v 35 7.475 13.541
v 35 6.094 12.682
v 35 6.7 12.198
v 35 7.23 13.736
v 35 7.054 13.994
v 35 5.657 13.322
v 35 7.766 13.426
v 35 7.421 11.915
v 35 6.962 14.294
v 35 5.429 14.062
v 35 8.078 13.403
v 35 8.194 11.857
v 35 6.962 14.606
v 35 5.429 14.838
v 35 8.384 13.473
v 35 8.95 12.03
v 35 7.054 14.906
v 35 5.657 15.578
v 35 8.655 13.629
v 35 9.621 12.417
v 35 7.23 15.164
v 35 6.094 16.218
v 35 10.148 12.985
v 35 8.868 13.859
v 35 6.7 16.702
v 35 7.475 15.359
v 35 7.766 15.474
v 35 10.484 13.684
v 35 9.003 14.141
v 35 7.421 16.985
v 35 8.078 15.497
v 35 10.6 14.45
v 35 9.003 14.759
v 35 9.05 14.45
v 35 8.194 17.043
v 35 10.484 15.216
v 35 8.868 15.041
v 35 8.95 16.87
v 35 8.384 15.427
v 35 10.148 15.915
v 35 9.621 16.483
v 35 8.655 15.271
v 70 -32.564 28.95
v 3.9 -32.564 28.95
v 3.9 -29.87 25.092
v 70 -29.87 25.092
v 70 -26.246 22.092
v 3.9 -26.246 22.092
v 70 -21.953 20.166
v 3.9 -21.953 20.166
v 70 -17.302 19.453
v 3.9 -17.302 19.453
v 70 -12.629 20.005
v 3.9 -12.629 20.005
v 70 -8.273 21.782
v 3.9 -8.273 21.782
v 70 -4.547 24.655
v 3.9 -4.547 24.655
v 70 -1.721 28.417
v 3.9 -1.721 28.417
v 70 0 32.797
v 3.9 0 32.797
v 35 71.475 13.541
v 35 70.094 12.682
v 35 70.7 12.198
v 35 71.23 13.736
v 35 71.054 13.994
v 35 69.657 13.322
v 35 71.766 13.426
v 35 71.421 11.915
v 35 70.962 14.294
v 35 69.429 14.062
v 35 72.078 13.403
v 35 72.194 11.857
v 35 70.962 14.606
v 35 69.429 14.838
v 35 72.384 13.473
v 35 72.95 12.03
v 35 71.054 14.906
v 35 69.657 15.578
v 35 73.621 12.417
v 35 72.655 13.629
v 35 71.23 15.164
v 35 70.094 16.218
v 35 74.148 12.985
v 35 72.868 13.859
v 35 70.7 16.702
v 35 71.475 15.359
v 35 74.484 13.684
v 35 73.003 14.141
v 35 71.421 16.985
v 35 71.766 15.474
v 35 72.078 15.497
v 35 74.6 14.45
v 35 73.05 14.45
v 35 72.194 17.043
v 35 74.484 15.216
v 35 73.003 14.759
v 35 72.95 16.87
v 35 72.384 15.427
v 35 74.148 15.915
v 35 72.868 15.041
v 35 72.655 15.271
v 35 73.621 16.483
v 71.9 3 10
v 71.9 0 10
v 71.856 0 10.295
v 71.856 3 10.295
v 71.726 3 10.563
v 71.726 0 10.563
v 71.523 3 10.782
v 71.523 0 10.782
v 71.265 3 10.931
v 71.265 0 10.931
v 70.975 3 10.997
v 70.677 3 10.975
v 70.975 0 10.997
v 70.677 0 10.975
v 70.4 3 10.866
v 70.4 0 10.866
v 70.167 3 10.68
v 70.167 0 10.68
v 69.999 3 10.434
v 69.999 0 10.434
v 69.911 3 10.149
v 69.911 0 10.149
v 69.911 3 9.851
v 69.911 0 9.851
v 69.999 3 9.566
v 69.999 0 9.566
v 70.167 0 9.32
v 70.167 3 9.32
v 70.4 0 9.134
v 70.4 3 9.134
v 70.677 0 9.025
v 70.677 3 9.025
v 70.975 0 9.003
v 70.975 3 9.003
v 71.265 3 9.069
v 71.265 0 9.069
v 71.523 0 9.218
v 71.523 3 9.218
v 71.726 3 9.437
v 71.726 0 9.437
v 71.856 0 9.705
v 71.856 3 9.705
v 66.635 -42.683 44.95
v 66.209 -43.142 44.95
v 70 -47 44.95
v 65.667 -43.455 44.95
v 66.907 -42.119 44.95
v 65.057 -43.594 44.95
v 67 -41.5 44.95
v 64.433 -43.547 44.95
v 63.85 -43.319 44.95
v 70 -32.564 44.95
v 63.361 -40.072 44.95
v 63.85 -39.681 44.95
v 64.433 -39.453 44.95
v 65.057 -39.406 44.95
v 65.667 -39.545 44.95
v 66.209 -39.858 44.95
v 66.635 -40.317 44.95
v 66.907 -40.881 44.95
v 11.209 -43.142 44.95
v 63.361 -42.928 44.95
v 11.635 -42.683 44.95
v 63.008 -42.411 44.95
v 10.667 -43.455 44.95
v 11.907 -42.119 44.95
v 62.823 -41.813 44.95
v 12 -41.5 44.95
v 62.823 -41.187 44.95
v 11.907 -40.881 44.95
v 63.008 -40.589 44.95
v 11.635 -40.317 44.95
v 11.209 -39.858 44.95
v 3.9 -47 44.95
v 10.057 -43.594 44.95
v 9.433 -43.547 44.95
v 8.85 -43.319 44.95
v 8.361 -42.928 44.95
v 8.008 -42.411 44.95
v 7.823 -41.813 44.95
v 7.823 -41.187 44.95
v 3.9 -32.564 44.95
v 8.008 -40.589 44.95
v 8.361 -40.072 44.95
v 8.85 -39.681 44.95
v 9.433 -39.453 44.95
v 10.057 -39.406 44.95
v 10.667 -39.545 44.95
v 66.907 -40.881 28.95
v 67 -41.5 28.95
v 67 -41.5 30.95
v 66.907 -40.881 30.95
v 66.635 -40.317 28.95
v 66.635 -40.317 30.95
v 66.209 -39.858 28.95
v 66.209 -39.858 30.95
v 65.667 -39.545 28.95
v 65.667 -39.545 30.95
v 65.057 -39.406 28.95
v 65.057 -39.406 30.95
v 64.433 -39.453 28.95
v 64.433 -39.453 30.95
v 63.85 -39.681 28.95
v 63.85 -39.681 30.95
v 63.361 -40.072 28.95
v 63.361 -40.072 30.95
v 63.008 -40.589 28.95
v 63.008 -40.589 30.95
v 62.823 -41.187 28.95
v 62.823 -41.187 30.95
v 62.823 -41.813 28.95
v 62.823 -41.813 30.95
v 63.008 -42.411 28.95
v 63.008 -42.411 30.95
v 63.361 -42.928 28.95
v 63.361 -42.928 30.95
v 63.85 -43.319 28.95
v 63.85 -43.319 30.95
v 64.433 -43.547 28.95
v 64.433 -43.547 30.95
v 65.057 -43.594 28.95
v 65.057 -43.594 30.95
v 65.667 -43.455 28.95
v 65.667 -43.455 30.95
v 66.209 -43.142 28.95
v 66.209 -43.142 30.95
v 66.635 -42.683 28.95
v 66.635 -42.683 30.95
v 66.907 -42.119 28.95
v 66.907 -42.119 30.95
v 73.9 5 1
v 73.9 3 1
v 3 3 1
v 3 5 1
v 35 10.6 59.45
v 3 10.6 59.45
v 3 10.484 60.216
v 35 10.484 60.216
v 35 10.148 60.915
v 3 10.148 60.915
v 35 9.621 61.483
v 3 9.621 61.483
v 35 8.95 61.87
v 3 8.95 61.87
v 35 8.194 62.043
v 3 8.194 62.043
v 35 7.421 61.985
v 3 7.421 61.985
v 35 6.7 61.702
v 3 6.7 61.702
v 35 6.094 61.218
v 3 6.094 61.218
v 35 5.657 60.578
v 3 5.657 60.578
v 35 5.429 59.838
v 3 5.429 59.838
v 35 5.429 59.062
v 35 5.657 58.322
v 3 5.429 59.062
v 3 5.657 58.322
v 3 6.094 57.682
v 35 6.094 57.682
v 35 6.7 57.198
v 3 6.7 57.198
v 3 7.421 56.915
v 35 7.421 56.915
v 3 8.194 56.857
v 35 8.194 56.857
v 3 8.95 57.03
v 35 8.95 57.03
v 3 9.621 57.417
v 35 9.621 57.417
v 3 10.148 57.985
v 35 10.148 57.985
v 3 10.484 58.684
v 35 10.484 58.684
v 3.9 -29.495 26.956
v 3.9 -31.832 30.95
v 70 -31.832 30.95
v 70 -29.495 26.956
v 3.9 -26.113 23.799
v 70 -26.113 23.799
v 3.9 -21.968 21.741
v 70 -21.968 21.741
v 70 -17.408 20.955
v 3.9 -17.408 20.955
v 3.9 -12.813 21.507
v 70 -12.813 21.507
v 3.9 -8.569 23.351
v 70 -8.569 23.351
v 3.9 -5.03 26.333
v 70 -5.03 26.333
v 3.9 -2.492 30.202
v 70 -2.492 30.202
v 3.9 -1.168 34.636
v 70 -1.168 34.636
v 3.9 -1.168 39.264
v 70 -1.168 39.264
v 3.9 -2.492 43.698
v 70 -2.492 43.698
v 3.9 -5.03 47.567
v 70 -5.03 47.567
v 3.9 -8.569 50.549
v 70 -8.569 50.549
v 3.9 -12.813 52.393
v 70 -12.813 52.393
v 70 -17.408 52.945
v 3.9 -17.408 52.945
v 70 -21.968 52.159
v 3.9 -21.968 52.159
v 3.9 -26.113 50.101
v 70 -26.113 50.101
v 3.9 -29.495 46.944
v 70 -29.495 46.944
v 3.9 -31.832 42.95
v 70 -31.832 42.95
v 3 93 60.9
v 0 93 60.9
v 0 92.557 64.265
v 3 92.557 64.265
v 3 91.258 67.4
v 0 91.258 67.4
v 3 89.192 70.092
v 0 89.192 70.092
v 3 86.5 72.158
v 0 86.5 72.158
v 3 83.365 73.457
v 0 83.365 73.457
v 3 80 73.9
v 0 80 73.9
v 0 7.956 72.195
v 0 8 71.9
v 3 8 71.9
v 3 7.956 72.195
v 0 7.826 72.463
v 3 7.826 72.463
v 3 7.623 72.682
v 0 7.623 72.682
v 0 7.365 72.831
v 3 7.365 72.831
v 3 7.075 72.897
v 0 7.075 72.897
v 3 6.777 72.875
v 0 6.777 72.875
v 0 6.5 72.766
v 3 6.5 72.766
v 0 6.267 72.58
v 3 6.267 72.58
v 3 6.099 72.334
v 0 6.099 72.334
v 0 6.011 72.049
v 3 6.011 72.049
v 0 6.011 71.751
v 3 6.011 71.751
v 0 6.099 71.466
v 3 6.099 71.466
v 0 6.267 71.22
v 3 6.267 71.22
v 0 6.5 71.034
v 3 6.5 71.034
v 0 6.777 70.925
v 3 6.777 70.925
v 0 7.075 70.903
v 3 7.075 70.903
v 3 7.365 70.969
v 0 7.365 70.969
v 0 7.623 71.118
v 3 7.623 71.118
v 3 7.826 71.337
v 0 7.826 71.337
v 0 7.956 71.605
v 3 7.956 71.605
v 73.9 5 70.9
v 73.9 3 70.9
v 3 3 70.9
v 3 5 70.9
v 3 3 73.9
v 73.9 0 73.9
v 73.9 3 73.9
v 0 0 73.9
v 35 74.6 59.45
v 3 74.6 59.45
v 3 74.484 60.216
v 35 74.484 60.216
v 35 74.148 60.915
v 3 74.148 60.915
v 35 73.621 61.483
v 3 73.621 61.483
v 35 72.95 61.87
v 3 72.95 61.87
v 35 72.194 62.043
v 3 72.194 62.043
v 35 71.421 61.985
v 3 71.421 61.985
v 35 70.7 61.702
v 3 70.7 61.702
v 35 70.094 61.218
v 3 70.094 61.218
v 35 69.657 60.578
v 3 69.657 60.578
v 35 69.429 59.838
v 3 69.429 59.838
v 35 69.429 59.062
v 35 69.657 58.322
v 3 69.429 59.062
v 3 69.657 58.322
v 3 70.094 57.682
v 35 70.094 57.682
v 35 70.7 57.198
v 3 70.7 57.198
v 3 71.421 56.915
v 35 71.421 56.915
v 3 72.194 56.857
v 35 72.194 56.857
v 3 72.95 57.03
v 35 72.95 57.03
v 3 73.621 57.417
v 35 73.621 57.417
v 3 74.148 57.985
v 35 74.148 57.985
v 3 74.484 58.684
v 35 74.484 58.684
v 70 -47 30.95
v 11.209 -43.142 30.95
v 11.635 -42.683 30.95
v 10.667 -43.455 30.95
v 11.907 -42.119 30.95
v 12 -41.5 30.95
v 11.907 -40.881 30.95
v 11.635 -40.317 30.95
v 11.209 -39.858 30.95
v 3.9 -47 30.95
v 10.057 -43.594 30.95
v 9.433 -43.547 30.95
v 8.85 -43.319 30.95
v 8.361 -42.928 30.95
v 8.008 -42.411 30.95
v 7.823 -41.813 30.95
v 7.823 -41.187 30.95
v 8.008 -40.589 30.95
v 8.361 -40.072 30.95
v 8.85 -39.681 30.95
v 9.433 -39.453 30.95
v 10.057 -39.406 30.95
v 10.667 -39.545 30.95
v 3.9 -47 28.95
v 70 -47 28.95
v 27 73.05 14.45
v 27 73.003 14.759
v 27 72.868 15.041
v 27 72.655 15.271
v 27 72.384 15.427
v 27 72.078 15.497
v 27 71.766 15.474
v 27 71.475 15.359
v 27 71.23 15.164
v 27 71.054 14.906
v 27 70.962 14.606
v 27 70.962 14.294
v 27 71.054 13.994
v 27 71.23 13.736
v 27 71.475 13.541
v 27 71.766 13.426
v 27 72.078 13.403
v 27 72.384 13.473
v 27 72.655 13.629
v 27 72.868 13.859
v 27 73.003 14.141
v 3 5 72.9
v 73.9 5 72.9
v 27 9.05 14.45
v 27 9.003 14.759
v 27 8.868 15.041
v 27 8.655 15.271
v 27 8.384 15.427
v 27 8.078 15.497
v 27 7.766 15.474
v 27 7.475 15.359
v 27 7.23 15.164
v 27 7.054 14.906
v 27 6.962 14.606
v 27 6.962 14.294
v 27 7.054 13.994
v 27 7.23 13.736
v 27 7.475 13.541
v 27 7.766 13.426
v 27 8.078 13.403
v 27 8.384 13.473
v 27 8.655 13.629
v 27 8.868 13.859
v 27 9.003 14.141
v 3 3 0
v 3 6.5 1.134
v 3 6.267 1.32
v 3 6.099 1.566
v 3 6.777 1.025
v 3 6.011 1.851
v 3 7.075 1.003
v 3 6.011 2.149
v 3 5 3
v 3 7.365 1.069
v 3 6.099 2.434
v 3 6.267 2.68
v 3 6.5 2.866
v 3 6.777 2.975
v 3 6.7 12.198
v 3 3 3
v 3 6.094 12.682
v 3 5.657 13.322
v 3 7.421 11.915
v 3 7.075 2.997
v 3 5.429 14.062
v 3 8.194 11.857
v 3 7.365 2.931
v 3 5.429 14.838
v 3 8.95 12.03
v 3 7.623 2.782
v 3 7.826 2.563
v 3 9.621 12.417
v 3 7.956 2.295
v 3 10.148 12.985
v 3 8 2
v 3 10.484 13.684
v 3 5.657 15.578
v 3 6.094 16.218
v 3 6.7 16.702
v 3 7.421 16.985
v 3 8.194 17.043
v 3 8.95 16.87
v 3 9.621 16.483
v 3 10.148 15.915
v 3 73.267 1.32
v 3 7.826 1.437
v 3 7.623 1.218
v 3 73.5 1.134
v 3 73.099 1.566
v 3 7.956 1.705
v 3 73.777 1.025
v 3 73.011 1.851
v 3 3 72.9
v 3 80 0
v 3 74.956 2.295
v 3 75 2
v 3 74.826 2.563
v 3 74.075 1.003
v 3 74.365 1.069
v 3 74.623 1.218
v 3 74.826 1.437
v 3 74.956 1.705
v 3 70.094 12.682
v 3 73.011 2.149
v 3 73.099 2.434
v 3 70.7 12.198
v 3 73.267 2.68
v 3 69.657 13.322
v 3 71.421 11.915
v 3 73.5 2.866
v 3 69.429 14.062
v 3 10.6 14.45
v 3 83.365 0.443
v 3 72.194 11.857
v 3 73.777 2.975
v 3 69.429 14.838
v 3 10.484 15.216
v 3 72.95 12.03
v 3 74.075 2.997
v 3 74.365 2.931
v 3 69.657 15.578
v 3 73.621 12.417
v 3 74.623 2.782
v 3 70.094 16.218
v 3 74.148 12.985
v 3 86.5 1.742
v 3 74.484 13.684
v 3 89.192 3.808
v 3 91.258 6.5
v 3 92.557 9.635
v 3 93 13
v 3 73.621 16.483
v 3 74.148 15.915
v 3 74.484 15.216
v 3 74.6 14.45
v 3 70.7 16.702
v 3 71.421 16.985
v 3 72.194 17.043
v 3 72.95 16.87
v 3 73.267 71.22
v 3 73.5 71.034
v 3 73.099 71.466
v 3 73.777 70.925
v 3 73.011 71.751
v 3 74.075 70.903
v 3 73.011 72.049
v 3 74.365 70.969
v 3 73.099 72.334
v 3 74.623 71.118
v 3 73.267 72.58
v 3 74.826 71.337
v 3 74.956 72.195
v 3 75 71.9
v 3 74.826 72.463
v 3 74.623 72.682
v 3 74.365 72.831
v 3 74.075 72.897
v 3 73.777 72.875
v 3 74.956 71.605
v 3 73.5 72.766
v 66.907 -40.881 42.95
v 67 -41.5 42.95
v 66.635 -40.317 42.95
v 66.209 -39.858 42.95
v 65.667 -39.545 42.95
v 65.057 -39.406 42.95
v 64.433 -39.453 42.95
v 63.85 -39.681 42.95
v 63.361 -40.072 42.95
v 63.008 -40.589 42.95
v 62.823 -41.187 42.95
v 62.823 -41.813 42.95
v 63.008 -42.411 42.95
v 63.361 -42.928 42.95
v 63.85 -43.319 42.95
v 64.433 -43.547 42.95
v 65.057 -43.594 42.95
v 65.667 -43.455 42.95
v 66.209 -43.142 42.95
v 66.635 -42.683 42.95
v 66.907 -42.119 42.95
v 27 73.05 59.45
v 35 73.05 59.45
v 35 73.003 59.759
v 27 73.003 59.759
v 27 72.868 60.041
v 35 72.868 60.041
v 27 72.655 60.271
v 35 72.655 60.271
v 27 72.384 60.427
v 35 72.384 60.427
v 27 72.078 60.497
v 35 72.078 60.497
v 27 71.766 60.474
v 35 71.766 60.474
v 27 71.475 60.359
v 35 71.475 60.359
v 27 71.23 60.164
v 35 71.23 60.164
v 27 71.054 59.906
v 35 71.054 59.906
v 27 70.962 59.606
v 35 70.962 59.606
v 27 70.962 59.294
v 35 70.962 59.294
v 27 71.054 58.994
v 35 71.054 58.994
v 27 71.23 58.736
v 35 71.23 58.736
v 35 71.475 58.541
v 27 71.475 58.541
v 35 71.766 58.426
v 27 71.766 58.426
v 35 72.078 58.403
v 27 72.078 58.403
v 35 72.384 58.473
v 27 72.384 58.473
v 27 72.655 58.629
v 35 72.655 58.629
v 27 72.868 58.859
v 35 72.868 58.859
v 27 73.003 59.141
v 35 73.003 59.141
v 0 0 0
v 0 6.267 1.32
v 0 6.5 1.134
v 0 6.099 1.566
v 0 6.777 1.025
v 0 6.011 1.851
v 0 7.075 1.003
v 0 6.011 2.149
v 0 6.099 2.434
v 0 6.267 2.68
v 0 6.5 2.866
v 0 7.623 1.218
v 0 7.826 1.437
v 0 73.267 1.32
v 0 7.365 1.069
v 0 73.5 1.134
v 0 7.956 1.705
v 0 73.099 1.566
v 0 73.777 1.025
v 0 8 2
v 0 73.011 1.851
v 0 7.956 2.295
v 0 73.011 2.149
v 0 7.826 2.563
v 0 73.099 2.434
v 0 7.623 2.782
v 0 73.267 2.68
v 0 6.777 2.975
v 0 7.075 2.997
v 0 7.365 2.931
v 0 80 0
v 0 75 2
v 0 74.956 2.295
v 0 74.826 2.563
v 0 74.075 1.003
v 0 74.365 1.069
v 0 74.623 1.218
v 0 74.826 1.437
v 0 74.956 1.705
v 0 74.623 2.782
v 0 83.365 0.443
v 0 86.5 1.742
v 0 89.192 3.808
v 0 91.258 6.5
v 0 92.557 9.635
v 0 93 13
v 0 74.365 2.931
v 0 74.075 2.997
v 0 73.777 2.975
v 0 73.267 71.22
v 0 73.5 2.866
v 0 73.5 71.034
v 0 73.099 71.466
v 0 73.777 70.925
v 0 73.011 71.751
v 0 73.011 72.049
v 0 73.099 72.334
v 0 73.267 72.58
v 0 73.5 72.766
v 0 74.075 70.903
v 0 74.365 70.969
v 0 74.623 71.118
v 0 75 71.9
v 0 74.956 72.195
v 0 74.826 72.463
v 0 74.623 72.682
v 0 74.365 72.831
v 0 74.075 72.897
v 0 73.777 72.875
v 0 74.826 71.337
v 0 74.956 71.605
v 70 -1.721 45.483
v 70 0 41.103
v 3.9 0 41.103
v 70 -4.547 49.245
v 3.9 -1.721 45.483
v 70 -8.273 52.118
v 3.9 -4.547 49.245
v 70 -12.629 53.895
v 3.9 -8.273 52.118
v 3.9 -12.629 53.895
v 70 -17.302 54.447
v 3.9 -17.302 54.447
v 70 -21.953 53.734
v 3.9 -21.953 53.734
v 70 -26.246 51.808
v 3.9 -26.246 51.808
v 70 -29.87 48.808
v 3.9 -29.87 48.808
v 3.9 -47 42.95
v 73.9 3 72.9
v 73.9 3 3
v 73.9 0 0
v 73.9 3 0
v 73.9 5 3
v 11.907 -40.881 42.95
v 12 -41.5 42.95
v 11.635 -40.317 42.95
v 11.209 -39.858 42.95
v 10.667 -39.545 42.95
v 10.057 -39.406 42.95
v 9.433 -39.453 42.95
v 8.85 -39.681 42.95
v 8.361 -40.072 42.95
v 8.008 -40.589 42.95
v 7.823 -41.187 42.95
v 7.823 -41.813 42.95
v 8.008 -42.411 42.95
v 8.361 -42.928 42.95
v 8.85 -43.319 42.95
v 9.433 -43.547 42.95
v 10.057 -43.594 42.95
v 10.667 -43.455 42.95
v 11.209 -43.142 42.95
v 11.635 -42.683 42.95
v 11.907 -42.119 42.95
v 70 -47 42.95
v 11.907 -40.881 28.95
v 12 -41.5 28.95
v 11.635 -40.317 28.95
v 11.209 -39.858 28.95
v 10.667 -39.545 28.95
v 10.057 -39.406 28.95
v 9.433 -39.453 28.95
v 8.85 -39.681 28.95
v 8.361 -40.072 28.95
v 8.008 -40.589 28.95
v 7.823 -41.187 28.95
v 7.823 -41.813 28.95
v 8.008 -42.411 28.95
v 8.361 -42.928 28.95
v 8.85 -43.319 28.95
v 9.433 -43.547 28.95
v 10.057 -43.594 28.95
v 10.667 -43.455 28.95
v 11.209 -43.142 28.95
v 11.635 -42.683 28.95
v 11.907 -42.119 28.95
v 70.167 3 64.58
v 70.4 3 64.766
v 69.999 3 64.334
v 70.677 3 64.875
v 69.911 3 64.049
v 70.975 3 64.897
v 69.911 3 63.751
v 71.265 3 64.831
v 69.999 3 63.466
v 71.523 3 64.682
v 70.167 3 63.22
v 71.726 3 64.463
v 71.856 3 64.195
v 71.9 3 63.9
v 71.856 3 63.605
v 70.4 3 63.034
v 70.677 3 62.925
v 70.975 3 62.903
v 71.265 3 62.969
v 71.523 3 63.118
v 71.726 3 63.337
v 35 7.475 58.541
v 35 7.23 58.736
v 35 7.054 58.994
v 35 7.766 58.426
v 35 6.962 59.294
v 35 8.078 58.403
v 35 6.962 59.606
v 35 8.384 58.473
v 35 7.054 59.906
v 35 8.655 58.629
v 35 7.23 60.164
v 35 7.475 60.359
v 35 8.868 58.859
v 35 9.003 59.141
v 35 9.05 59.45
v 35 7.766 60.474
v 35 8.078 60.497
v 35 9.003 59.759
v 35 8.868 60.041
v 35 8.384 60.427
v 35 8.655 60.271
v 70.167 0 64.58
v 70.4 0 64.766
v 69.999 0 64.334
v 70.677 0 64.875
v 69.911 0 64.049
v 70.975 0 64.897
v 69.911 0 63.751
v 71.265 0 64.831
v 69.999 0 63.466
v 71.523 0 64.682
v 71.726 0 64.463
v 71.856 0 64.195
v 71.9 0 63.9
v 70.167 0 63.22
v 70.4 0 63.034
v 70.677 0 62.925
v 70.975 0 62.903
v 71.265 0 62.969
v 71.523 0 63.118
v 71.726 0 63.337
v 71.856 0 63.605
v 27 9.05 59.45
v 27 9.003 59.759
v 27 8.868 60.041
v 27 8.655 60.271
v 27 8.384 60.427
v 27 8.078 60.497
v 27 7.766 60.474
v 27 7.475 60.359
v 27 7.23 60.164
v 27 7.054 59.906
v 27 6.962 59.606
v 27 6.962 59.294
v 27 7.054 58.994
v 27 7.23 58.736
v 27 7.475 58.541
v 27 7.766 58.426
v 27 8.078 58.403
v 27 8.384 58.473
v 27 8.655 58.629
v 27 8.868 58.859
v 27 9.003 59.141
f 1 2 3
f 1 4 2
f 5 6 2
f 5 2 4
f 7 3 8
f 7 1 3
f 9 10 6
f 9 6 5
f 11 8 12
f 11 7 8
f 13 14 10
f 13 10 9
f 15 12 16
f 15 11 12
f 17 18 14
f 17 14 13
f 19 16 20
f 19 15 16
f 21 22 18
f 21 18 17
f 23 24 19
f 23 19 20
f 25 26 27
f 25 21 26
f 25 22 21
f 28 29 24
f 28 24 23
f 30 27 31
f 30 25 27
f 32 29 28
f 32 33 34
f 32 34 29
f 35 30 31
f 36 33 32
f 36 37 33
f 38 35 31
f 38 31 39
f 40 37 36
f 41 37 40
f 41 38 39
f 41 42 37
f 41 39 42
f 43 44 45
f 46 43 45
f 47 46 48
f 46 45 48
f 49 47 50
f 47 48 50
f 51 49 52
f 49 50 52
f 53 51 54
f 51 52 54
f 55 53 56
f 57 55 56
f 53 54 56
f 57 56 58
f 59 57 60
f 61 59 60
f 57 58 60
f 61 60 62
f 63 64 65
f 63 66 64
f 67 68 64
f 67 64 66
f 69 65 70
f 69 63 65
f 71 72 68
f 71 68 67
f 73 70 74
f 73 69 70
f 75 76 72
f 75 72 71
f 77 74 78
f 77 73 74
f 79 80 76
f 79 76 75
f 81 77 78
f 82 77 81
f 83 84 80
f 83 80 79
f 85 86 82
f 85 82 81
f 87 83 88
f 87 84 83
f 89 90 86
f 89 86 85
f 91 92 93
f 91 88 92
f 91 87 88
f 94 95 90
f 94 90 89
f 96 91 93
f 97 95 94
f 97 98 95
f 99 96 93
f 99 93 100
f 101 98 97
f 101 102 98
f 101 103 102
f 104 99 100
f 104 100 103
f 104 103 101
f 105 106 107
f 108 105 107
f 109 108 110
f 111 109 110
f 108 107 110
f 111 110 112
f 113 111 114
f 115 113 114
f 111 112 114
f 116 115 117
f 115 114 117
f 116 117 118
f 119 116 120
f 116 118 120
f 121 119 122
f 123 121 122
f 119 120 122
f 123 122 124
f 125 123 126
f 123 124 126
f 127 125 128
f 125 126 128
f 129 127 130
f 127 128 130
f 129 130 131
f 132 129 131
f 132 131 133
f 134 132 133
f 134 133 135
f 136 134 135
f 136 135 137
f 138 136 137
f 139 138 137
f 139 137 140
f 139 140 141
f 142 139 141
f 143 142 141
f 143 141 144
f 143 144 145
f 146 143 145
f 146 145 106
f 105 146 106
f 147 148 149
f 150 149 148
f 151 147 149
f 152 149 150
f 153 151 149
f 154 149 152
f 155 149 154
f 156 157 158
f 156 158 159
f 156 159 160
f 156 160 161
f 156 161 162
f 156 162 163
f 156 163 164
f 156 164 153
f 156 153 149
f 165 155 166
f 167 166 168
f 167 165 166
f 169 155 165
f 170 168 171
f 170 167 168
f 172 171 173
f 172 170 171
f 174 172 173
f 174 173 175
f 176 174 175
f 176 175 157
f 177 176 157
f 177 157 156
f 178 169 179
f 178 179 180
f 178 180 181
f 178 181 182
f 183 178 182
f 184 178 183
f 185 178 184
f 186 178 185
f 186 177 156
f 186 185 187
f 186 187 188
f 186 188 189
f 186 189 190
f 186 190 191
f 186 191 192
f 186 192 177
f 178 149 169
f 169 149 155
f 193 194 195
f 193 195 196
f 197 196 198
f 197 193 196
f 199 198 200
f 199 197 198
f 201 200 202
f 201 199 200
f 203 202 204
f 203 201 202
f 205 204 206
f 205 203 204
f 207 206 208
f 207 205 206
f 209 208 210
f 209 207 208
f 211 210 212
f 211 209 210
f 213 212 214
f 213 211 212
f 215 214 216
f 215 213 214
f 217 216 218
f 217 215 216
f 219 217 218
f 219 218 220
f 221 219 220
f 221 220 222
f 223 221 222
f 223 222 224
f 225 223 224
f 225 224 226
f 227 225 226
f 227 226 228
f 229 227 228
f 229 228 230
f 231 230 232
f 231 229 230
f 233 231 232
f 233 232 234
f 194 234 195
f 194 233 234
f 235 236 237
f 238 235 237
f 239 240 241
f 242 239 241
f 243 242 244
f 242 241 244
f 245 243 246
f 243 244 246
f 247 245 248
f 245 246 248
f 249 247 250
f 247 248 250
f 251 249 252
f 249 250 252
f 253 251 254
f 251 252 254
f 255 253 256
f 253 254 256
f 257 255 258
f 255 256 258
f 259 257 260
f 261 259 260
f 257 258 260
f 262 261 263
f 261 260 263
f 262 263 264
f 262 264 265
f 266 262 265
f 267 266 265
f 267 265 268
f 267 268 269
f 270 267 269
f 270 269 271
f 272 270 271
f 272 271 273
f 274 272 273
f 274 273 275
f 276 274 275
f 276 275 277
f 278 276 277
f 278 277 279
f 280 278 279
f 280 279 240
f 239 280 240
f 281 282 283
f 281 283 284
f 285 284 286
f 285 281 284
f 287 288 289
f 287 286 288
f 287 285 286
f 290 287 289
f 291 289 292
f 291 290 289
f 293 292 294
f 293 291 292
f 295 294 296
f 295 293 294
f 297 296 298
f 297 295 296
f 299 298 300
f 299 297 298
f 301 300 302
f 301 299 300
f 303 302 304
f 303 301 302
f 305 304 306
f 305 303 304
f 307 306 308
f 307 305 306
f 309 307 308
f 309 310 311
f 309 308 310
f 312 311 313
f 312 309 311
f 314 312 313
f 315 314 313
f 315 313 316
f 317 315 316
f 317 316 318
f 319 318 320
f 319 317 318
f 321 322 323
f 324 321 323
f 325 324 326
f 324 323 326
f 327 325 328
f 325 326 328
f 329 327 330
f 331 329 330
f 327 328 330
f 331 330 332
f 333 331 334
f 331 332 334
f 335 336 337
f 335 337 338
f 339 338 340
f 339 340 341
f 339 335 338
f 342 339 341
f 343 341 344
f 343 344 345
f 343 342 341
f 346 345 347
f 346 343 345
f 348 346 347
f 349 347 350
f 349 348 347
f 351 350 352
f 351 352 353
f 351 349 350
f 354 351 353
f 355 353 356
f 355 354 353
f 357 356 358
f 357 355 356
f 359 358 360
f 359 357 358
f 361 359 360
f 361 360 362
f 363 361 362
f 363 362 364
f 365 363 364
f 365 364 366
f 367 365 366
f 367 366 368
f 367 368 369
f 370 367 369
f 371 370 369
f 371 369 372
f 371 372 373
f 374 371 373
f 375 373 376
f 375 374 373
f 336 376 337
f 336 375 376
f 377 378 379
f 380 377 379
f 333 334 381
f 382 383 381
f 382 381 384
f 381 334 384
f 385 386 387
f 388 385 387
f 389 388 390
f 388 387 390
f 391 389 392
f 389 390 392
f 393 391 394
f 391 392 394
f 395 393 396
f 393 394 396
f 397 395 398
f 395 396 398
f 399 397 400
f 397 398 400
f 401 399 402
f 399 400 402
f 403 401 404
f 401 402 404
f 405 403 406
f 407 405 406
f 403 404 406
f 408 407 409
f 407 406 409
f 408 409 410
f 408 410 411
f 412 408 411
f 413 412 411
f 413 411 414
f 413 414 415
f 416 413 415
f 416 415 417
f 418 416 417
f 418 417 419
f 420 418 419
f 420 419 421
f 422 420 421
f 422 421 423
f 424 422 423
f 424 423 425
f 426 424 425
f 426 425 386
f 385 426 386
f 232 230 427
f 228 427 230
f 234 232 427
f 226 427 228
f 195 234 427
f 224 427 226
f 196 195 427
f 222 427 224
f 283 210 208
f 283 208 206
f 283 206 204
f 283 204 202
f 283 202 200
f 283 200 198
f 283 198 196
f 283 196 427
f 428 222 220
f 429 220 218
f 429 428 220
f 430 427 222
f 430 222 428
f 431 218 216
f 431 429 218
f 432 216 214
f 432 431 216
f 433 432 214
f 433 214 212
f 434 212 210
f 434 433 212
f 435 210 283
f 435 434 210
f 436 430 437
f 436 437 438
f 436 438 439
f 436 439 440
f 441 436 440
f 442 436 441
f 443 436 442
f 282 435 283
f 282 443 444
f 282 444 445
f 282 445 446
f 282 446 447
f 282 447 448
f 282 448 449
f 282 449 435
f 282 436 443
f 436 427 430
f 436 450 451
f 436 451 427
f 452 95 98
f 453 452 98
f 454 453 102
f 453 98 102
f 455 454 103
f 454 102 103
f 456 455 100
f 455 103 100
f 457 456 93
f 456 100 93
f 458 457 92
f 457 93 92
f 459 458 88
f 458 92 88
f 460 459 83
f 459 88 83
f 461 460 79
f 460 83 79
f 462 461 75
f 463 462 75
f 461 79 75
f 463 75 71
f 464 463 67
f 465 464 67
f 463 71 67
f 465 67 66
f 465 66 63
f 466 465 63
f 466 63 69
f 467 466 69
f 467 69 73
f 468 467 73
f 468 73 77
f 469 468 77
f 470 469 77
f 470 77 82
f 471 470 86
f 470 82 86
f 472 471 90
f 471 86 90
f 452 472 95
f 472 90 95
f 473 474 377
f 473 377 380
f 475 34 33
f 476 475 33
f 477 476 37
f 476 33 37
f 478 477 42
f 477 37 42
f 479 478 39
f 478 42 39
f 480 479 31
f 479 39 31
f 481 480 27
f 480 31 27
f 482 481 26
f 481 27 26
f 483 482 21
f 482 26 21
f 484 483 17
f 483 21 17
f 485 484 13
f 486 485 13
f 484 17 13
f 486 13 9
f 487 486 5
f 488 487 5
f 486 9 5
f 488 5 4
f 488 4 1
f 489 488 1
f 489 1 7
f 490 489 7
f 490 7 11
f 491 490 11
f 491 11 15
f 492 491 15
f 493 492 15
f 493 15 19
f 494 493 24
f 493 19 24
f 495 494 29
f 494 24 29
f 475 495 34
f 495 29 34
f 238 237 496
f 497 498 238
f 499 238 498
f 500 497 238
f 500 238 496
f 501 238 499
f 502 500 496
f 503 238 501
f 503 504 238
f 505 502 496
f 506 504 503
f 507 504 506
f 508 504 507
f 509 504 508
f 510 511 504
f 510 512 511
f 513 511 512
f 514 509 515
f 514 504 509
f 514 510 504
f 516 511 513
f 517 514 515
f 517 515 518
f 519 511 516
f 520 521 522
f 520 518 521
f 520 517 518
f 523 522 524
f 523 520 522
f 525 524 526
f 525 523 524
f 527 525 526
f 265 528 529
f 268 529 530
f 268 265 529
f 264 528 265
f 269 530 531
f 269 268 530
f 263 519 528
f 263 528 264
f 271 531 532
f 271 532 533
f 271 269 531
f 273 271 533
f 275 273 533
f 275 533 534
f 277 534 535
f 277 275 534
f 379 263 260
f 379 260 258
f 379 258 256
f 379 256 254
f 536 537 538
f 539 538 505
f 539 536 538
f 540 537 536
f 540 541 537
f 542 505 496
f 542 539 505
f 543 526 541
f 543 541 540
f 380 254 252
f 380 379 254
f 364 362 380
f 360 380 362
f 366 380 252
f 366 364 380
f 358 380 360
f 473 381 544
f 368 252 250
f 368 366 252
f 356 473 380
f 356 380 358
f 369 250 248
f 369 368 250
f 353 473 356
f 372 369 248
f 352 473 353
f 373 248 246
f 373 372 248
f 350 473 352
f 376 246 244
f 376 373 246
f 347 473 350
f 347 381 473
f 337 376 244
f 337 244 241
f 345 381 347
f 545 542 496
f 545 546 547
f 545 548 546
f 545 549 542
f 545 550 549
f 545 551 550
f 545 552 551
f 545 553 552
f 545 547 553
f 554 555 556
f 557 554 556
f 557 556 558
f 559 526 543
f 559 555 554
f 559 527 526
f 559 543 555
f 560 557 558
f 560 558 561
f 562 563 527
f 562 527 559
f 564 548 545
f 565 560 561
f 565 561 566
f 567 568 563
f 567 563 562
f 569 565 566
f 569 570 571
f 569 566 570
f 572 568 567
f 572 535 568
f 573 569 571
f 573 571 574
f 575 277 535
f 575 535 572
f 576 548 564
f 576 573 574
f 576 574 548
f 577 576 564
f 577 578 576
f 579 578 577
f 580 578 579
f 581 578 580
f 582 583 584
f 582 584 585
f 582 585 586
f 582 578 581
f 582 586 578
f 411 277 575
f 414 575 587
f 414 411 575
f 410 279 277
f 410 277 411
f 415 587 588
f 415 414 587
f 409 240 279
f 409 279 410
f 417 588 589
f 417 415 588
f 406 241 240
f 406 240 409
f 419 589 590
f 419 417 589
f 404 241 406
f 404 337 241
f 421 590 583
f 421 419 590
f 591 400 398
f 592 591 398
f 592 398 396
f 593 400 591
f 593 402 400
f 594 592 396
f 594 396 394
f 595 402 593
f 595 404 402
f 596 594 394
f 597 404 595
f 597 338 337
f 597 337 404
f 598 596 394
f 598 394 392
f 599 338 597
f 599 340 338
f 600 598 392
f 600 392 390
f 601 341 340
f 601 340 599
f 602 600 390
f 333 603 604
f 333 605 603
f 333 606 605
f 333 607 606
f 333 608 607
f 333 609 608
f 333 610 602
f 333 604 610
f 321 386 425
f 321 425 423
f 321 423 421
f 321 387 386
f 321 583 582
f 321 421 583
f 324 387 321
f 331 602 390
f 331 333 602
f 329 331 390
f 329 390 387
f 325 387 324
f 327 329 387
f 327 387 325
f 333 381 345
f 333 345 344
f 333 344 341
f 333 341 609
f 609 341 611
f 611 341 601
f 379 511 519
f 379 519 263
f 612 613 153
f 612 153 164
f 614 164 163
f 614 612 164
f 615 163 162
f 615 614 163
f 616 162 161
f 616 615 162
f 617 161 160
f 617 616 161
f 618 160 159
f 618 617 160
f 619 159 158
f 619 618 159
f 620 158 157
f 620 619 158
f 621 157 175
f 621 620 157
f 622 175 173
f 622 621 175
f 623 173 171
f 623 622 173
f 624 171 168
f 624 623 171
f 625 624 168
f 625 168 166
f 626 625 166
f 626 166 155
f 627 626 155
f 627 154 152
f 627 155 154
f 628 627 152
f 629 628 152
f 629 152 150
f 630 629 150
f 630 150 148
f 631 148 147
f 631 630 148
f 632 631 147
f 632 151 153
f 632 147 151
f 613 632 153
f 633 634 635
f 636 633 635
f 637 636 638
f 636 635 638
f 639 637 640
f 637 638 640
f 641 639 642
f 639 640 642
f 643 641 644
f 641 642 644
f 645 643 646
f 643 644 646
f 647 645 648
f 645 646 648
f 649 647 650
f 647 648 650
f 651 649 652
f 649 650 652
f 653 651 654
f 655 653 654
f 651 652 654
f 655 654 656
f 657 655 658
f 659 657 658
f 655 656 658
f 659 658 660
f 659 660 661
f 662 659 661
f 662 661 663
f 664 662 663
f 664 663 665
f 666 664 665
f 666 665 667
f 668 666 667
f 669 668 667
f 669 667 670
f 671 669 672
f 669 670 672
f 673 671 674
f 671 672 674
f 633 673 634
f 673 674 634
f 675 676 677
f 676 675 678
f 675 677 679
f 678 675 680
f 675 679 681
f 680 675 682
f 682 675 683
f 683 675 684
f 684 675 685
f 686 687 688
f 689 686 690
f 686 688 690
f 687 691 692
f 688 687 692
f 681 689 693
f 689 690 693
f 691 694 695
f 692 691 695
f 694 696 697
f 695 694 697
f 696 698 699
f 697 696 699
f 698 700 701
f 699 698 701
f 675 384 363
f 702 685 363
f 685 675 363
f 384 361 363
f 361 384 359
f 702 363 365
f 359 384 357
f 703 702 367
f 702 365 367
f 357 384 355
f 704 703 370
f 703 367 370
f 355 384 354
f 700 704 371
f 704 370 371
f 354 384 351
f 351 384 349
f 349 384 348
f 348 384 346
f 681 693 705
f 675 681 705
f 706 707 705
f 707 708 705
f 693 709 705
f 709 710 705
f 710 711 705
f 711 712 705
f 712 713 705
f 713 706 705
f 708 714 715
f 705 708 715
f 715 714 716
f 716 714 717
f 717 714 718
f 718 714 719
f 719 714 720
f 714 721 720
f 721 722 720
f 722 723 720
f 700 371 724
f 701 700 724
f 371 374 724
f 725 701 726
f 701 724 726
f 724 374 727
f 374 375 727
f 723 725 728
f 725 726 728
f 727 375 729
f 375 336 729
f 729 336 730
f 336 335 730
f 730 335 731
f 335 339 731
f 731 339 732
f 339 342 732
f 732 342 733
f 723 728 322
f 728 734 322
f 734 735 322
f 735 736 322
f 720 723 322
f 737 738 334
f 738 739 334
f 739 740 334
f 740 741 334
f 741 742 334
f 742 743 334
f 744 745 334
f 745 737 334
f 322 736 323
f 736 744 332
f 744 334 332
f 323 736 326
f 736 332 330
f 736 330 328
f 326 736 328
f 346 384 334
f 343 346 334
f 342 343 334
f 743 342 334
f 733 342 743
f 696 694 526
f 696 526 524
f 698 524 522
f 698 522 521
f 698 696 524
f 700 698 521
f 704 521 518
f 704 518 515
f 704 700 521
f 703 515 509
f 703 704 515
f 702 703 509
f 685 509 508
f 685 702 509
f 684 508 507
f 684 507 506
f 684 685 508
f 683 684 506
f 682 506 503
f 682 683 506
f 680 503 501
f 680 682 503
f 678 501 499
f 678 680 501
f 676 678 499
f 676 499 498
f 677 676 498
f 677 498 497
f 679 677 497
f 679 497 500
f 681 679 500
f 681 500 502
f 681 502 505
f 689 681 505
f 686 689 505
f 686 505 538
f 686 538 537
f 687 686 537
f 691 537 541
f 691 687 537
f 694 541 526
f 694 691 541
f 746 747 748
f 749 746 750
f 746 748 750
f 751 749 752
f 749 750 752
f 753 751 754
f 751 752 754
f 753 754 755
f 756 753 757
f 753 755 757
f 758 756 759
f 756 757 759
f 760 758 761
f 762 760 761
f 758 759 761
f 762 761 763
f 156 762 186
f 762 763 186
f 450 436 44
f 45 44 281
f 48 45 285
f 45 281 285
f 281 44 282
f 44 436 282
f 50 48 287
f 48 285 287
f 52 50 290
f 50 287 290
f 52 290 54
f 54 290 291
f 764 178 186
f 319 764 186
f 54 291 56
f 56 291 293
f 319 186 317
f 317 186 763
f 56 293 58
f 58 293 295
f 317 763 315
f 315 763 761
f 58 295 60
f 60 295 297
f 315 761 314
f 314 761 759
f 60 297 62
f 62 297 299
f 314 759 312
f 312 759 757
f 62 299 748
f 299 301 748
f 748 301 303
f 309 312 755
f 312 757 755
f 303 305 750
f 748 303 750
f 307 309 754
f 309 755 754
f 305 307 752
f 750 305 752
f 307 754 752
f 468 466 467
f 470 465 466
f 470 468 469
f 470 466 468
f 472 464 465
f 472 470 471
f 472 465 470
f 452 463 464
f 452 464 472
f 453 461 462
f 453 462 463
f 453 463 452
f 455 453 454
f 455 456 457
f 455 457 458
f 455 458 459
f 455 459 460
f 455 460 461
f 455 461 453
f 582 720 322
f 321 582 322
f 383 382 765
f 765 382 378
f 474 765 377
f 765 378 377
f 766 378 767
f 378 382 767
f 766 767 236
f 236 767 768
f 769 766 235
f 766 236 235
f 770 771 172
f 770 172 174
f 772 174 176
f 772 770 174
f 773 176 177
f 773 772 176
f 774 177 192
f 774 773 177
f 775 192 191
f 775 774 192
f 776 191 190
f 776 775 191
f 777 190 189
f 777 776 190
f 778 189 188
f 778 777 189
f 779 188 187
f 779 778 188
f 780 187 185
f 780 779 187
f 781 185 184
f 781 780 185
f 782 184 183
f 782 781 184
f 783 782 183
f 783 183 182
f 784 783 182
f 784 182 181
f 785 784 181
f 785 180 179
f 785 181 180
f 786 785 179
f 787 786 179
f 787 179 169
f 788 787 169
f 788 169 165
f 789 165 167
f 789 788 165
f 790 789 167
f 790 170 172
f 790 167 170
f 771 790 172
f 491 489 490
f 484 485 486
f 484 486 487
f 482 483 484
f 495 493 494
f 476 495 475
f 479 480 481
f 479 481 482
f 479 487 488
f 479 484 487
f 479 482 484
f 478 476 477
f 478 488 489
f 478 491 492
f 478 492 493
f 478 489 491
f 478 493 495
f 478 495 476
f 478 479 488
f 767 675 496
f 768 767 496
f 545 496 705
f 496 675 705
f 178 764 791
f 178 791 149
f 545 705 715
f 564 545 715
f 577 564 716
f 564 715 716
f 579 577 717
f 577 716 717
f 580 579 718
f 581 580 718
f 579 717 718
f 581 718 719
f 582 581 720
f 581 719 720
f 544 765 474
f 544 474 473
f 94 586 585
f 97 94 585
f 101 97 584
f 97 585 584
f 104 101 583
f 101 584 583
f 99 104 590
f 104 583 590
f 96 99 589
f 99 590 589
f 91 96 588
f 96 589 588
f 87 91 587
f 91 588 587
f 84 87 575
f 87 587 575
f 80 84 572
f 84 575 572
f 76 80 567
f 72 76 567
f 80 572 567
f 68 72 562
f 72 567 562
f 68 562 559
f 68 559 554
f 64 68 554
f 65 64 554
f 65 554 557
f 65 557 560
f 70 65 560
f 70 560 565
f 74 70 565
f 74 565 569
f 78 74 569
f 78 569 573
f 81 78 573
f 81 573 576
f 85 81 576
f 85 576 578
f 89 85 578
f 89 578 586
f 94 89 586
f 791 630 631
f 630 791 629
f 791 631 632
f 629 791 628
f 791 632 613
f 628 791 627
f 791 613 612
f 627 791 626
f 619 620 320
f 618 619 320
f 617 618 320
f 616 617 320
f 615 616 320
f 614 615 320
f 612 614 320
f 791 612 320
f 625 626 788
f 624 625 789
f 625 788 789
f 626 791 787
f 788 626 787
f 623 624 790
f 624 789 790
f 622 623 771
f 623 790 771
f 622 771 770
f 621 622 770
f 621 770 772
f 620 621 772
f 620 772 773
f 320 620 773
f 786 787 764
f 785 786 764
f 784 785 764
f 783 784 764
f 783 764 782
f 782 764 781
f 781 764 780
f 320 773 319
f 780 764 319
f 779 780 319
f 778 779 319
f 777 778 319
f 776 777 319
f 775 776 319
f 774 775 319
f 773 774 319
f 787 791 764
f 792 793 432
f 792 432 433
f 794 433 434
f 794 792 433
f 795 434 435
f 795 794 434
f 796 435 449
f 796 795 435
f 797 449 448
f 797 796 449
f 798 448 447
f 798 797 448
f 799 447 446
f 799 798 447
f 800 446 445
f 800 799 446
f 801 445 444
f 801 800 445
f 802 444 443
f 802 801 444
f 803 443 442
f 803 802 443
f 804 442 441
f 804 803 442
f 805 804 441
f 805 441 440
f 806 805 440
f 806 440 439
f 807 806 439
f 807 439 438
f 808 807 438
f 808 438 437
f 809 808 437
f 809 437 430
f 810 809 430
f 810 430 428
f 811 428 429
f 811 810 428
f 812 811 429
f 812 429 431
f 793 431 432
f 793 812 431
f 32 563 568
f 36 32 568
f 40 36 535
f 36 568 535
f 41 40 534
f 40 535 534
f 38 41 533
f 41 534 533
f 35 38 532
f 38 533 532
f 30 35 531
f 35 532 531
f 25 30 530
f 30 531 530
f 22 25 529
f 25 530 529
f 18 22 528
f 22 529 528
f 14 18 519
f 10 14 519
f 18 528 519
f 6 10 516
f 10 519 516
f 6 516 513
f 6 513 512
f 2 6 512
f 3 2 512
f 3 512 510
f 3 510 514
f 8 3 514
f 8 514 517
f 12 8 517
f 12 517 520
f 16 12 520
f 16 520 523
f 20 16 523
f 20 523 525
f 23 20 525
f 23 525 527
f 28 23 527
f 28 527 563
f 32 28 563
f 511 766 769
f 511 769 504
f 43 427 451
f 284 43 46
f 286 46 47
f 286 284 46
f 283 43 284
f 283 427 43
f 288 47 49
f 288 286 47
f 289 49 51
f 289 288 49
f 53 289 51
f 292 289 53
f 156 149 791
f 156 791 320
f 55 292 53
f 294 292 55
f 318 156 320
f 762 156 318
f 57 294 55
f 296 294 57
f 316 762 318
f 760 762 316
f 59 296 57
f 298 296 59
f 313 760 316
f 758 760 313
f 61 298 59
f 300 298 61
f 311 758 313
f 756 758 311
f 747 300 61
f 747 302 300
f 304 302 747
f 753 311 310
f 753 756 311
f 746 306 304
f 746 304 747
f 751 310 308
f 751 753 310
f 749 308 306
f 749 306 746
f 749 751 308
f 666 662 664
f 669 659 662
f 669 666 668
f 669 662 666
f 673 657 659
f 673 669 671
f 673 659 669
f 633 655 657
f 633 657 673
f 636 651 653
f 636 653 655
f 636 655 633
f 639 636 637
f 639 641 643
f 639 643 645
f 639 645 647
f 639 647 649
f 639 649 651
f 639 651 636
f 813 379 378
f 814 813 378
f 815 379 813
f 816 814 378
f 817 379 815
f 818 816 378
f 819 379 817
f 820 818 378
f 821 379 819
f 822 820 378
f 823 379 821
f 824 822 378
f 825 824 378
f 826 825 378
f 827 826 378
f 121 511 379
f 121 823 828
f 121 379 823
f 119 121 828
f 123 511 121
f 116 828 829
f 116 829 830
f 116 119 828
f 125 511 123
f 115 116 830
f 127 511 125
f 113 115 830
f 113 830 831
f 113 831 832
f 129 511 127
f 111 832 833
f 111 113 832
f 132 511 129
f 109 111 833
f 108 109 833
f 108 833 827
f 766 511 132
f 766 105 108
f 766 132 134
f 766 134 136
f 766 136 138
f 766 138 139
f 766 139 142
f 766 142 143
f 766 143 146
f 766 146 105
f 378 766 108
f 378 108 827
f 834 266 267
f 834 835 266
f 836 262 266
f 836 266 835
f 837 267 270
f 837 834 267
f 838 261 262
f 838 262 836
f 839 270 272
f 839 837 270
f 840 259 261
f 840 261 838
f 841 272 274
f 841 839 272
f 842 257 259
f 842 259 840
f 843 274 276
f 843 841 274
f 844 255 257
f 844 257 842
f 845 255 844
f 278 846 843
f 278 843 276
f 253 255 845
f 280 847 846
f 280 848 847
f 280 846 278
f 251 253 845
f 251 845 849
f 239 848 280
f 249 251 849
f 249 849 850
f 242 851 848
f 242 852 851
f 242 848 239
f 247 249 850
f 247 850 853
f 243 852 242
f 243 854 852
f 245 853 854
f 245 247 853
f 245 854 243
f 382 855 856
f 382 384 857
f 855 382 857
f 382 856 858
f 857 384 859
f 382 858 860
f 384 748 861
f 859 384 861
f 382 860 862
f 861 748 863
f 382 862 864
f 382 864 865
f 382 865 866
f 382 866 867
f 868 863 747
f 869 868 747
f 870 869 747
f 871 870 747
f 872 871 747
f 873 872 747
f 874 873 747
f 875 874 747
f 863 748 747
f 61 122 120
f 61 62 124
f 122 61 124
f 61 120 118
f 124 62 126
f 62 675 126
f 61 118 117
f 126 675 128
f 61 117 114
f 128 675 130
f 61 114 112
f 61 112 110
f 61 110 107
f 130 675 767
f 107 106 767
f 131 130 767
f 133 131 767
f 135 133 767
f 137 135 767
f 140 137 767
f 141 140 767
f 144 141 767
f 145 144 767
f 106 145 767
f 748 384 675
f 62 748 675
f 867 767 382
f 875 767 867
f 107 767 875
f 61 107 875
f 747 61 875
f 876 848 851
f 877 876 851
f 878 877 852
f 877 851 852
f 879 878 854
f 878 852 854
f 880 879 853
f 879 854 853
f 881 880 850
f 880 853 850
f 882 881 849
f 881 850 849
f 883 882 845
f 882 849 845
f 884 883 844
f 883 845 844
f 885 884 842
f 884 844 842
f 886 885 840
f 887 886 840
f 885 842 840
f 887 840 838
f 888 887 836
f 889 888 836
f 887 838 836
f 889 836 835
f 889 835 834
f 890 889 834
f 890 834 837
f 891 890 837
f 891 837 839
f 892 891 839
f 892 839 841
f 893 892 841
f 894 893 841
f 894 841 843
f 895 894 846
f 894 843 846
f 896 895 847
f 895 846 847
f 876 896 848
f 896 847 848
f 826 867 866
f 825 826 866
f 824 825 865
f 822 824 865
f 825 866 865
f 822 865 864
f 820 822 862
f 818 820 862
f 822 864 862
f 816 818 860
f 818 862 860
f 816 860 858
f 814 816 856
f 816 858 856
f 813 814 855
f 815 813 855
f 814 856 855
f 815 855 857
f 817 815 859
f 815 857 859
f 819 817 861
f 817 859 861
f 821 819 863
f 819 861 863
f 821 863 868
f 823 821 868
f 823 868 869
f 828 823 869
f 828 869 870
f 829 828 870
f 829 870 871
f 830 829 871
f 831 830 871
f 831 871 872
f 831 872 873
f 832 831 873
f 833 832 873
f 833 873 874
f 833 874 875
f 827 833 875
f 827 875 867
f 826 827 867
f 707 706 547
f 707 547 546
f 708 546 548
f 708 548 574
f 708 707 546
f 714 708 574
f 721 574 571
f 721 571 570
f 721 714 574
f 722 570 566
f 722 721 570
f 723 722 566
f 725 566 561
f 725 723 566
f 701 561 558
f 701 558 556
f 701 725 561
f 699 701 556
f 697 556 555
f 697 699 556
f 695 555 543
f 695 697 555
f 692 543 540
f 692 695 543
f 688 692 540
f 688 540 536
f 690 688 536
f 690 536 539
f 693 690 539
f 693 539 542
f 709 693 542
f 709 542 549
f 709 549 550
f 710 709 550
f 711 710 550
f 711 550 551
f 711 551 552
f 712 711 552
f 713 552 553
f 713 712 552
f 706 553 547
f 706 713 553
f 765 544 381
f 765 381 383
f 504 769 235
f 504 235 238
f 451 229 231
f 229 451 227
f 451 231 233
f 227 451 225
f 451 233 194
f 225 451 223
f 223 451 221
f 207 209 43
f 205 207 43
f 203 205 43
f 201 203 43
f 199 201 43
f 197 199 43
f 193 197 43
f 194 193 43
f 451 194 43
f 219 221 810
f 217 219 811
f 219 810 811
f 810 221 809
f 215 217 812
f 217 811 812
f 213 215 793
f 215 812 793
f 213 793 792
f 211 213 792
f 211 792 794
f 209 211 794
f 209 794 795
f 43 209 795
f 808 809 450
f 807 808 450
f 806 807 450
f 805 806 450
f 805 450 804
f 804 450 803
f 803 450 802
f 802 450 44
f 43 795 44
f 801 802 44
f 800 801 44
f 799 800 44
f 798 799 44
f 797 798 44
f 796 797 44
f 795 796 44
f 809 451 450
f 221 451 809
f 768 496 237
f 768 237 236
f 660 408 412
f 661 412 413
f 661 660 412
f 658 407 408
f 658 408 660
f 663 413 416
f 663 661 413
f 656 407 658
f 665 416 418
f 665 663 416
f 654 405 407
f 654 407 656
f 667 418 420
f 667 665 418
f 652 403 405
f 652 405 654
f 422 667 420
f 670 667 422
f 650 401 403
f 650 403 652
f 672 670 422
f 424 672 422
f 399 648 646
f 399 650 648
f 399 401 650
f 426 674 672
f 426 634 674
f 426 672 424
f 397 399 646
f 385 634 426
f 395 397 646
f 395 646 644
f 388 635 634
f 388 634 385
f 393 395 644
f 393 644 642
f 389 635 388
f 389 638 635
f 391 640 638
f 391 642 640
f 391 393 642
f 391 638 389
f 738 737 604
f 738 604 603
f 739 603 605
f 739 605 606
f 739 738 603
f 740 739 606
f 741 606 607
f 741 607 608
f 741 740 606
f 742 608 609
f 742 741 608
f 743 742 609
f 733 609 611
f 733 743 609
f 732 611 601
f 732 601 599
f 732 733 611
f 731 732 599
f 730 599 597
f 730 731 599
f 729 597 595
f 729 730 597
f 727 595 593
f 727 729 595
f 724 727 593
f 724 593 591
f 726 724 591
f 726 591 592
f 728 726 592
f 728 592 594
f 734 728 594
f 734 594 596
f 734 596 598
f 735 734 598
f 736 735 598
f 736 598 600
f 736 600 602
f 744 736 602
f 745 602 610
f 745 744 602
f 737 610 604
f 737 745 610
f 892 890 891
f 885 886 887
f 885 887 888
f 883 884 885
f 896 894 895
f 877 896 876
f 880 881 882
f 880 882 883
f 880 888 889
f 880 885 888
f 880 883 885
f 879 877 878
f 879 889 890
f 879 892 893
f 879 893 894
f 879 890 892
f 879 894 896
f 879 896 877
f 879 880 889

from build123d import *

# Parameters (mm, degrees)
SKETCH105_W     = 73.9
SKETCH105_H     = 3
PAD050_DEPTH    = 73.9
SKETCH108_R     = 1
PAD052_DEPTH    = 3
SKETCH109_W     = 70.9
SKETCH109_H     = 2
PAD053_DEPTH    = 2
SKETCH110_R     = 2.6
PAD056_DEPTH    = 35
SKETCH111_R     = 1.05
POCKET060_DEPTH = 8
PAD060_START    = 3.9
SKETCH125_R     = 17.5
PAD060_DEPTH    = 66.1
SKETCH126_R     = 16
SKETCH126_W     = 30
SKETCH126_H     = 12
POCKET075_DEPTH = 73.901
PAD061_START    = 3.9
SKETCH127_W     = 15
SKETCH127_H     = 2
PAD061_DEPTH    = 66.1
SKETCH128_R     = 2.1
POCKET076_DEPTH = 73.901
SKETCH129_R     = 1
POCKET077_DEPTH = 5


with BuildPart() as part:
    # Sketch105 → Pad050 (new body)
    with BuildSketch(Plane.XY):
        with Locations((36.95, 1.5)):
            Rectangle(SKETCH105_W, SKETCH105_H)
    extrude(amount=PAD050_DEPTH)

    # Sketch108 → Pad052 (join)
    with BuildSketch(Plane.YZ):
        with BuildLine():
            Line((3, 0), (80, 0))
            ThreePointArc((80, 0), (89.1923881554, 3.8076118446), (93, 13))
            Line((93, 13), (93, 60.9))
            ThreePointArc((93, 60.9), (89.1923881554, 70.0923881554), (80, 73.9))
            Line((80, 73.9), (3, 73.9))
            Line((3, 73.9), (3, 0))
        make_face()
        with Locations((7, 2)):
            Circle(SKETCH108_R, mode=Mode.SUBTRACT)
        with Locations((74, 2)):
            Circle(SKETCH108_R, mode=Mode.SUBTRACT)
        with Locations((7, 71.9)):
            Circle(SKETCH108_R, mode=Mode.SUBTRACT)
        with Locations((74, 71.9)):
            Circle(SKETCH108_R, mode=Mode.SUBTRACT)
    extrude(amount=PAD052_DEPTH)

    # Sketch109 → Pad053 (join)
    with BuildSketch(Plane(origin=(0, 3, 0), x_dir=(-1, 0, 0), z_dir=(0, 1, 0))):
        with Locations((-38.45, 2)):
            Rectangle(SKETCH109_W, SKETCH109_H)
        with Locations((-38.45, 71.9)):
            Rectangle(SKETCH109_W, SKETCH109_H)
    extrude(amount=PAD053_DEPTH)

    # Sketch110 → Pad056 (join)
    with BuildSketch(Plane.YZ):
        with Locations((72, 14.45)):
            Circle(SKETCH110_R)
        with Locations((8, 14.45)):
            Circle(SKETCH110_R)
        with Locations((8, 59.45)):
            Circle(SKETCH110_R)
        with Locations((72, 59.45)):
            Circle(SKETCH110_R)
    extrude(amount=PAD056_DEPTH)

    # Sketch111 → Pocket060 (cut)
    with BuildSketch(Plane.YZ.offset(35)):
        with Locations((8, 14.45)):
            Circle(SKETCH111_R)
        with Locations((72, 14.45)):
            Circle(SKETCH111_R)
        with Locations((8, 59.45)):
            Circle(SKETCH111_R)
        with Locations((72, 59.45)):
            Circle(SKETCH111_R)
    extrude(amount=-POCKET060_DEPTH, mode=Mode.SUBTRACT)

    # Sketch125 → Pad060 (join)
    with BuildSketch(Plane.YZ.offset(PAD060_START)):
        with Locations((-17, 36.95)):
            Circle(SKETCH125_R)
    extrude(amount=PAD060_DEPTH)

    # Sketch126 → Pocket075 (cut, through all)
    with BuildSketch(Plane.YZ):
        with Locations((-17, 36.95)):
            Circle(SKETCH126_R)
        with Locations((-27.180588, 36.95)):
            Rectangle(SKETCH126_W, SKETCH126_H)
    extrude(amount=POCKET075_DEPTH, mode=Mode.SUBTRACT)

    # Sketch127 → Pad061 (join)
    with BuildSketch(Plane.YZ.offset(PAD061_START)):
        with Locations((-39.5, 43.95)):
            Rectangle(SKETCH127_W, SKETCH127_H)
        with Locations((-39.5, 29.95)):
            Rectangle(SKETCH127_W, SKETCH127_H)
    extrude(amount=PAD061_DEPTH)

    # Sketch128 → Pocket076 (cut, through all)
    with BuildSketch(Plane.XY):
        with Locations((9.9, -41.5)):
            Circle(SKETCH128_R)
        with Locations((64.9, -41.5)):
            Circle(SKETCH128_R)
    extrude(amount=POCKET076_DEPTH, mode=Mode.SUBTRACT)

    # Sketch129 → Pocket077 (cut)
    with BuildSketch(Plane.XZ):
        with Locations((70.9, 10)):
            Circle(SKETCH129_R)
        with Locations((70.9, 63.9)):
            Circle(SKETCH129_R)
    extrude(amount=-POCKET077_DEPTH, mode=Mode.SUBTRACT)


solid = part.part
